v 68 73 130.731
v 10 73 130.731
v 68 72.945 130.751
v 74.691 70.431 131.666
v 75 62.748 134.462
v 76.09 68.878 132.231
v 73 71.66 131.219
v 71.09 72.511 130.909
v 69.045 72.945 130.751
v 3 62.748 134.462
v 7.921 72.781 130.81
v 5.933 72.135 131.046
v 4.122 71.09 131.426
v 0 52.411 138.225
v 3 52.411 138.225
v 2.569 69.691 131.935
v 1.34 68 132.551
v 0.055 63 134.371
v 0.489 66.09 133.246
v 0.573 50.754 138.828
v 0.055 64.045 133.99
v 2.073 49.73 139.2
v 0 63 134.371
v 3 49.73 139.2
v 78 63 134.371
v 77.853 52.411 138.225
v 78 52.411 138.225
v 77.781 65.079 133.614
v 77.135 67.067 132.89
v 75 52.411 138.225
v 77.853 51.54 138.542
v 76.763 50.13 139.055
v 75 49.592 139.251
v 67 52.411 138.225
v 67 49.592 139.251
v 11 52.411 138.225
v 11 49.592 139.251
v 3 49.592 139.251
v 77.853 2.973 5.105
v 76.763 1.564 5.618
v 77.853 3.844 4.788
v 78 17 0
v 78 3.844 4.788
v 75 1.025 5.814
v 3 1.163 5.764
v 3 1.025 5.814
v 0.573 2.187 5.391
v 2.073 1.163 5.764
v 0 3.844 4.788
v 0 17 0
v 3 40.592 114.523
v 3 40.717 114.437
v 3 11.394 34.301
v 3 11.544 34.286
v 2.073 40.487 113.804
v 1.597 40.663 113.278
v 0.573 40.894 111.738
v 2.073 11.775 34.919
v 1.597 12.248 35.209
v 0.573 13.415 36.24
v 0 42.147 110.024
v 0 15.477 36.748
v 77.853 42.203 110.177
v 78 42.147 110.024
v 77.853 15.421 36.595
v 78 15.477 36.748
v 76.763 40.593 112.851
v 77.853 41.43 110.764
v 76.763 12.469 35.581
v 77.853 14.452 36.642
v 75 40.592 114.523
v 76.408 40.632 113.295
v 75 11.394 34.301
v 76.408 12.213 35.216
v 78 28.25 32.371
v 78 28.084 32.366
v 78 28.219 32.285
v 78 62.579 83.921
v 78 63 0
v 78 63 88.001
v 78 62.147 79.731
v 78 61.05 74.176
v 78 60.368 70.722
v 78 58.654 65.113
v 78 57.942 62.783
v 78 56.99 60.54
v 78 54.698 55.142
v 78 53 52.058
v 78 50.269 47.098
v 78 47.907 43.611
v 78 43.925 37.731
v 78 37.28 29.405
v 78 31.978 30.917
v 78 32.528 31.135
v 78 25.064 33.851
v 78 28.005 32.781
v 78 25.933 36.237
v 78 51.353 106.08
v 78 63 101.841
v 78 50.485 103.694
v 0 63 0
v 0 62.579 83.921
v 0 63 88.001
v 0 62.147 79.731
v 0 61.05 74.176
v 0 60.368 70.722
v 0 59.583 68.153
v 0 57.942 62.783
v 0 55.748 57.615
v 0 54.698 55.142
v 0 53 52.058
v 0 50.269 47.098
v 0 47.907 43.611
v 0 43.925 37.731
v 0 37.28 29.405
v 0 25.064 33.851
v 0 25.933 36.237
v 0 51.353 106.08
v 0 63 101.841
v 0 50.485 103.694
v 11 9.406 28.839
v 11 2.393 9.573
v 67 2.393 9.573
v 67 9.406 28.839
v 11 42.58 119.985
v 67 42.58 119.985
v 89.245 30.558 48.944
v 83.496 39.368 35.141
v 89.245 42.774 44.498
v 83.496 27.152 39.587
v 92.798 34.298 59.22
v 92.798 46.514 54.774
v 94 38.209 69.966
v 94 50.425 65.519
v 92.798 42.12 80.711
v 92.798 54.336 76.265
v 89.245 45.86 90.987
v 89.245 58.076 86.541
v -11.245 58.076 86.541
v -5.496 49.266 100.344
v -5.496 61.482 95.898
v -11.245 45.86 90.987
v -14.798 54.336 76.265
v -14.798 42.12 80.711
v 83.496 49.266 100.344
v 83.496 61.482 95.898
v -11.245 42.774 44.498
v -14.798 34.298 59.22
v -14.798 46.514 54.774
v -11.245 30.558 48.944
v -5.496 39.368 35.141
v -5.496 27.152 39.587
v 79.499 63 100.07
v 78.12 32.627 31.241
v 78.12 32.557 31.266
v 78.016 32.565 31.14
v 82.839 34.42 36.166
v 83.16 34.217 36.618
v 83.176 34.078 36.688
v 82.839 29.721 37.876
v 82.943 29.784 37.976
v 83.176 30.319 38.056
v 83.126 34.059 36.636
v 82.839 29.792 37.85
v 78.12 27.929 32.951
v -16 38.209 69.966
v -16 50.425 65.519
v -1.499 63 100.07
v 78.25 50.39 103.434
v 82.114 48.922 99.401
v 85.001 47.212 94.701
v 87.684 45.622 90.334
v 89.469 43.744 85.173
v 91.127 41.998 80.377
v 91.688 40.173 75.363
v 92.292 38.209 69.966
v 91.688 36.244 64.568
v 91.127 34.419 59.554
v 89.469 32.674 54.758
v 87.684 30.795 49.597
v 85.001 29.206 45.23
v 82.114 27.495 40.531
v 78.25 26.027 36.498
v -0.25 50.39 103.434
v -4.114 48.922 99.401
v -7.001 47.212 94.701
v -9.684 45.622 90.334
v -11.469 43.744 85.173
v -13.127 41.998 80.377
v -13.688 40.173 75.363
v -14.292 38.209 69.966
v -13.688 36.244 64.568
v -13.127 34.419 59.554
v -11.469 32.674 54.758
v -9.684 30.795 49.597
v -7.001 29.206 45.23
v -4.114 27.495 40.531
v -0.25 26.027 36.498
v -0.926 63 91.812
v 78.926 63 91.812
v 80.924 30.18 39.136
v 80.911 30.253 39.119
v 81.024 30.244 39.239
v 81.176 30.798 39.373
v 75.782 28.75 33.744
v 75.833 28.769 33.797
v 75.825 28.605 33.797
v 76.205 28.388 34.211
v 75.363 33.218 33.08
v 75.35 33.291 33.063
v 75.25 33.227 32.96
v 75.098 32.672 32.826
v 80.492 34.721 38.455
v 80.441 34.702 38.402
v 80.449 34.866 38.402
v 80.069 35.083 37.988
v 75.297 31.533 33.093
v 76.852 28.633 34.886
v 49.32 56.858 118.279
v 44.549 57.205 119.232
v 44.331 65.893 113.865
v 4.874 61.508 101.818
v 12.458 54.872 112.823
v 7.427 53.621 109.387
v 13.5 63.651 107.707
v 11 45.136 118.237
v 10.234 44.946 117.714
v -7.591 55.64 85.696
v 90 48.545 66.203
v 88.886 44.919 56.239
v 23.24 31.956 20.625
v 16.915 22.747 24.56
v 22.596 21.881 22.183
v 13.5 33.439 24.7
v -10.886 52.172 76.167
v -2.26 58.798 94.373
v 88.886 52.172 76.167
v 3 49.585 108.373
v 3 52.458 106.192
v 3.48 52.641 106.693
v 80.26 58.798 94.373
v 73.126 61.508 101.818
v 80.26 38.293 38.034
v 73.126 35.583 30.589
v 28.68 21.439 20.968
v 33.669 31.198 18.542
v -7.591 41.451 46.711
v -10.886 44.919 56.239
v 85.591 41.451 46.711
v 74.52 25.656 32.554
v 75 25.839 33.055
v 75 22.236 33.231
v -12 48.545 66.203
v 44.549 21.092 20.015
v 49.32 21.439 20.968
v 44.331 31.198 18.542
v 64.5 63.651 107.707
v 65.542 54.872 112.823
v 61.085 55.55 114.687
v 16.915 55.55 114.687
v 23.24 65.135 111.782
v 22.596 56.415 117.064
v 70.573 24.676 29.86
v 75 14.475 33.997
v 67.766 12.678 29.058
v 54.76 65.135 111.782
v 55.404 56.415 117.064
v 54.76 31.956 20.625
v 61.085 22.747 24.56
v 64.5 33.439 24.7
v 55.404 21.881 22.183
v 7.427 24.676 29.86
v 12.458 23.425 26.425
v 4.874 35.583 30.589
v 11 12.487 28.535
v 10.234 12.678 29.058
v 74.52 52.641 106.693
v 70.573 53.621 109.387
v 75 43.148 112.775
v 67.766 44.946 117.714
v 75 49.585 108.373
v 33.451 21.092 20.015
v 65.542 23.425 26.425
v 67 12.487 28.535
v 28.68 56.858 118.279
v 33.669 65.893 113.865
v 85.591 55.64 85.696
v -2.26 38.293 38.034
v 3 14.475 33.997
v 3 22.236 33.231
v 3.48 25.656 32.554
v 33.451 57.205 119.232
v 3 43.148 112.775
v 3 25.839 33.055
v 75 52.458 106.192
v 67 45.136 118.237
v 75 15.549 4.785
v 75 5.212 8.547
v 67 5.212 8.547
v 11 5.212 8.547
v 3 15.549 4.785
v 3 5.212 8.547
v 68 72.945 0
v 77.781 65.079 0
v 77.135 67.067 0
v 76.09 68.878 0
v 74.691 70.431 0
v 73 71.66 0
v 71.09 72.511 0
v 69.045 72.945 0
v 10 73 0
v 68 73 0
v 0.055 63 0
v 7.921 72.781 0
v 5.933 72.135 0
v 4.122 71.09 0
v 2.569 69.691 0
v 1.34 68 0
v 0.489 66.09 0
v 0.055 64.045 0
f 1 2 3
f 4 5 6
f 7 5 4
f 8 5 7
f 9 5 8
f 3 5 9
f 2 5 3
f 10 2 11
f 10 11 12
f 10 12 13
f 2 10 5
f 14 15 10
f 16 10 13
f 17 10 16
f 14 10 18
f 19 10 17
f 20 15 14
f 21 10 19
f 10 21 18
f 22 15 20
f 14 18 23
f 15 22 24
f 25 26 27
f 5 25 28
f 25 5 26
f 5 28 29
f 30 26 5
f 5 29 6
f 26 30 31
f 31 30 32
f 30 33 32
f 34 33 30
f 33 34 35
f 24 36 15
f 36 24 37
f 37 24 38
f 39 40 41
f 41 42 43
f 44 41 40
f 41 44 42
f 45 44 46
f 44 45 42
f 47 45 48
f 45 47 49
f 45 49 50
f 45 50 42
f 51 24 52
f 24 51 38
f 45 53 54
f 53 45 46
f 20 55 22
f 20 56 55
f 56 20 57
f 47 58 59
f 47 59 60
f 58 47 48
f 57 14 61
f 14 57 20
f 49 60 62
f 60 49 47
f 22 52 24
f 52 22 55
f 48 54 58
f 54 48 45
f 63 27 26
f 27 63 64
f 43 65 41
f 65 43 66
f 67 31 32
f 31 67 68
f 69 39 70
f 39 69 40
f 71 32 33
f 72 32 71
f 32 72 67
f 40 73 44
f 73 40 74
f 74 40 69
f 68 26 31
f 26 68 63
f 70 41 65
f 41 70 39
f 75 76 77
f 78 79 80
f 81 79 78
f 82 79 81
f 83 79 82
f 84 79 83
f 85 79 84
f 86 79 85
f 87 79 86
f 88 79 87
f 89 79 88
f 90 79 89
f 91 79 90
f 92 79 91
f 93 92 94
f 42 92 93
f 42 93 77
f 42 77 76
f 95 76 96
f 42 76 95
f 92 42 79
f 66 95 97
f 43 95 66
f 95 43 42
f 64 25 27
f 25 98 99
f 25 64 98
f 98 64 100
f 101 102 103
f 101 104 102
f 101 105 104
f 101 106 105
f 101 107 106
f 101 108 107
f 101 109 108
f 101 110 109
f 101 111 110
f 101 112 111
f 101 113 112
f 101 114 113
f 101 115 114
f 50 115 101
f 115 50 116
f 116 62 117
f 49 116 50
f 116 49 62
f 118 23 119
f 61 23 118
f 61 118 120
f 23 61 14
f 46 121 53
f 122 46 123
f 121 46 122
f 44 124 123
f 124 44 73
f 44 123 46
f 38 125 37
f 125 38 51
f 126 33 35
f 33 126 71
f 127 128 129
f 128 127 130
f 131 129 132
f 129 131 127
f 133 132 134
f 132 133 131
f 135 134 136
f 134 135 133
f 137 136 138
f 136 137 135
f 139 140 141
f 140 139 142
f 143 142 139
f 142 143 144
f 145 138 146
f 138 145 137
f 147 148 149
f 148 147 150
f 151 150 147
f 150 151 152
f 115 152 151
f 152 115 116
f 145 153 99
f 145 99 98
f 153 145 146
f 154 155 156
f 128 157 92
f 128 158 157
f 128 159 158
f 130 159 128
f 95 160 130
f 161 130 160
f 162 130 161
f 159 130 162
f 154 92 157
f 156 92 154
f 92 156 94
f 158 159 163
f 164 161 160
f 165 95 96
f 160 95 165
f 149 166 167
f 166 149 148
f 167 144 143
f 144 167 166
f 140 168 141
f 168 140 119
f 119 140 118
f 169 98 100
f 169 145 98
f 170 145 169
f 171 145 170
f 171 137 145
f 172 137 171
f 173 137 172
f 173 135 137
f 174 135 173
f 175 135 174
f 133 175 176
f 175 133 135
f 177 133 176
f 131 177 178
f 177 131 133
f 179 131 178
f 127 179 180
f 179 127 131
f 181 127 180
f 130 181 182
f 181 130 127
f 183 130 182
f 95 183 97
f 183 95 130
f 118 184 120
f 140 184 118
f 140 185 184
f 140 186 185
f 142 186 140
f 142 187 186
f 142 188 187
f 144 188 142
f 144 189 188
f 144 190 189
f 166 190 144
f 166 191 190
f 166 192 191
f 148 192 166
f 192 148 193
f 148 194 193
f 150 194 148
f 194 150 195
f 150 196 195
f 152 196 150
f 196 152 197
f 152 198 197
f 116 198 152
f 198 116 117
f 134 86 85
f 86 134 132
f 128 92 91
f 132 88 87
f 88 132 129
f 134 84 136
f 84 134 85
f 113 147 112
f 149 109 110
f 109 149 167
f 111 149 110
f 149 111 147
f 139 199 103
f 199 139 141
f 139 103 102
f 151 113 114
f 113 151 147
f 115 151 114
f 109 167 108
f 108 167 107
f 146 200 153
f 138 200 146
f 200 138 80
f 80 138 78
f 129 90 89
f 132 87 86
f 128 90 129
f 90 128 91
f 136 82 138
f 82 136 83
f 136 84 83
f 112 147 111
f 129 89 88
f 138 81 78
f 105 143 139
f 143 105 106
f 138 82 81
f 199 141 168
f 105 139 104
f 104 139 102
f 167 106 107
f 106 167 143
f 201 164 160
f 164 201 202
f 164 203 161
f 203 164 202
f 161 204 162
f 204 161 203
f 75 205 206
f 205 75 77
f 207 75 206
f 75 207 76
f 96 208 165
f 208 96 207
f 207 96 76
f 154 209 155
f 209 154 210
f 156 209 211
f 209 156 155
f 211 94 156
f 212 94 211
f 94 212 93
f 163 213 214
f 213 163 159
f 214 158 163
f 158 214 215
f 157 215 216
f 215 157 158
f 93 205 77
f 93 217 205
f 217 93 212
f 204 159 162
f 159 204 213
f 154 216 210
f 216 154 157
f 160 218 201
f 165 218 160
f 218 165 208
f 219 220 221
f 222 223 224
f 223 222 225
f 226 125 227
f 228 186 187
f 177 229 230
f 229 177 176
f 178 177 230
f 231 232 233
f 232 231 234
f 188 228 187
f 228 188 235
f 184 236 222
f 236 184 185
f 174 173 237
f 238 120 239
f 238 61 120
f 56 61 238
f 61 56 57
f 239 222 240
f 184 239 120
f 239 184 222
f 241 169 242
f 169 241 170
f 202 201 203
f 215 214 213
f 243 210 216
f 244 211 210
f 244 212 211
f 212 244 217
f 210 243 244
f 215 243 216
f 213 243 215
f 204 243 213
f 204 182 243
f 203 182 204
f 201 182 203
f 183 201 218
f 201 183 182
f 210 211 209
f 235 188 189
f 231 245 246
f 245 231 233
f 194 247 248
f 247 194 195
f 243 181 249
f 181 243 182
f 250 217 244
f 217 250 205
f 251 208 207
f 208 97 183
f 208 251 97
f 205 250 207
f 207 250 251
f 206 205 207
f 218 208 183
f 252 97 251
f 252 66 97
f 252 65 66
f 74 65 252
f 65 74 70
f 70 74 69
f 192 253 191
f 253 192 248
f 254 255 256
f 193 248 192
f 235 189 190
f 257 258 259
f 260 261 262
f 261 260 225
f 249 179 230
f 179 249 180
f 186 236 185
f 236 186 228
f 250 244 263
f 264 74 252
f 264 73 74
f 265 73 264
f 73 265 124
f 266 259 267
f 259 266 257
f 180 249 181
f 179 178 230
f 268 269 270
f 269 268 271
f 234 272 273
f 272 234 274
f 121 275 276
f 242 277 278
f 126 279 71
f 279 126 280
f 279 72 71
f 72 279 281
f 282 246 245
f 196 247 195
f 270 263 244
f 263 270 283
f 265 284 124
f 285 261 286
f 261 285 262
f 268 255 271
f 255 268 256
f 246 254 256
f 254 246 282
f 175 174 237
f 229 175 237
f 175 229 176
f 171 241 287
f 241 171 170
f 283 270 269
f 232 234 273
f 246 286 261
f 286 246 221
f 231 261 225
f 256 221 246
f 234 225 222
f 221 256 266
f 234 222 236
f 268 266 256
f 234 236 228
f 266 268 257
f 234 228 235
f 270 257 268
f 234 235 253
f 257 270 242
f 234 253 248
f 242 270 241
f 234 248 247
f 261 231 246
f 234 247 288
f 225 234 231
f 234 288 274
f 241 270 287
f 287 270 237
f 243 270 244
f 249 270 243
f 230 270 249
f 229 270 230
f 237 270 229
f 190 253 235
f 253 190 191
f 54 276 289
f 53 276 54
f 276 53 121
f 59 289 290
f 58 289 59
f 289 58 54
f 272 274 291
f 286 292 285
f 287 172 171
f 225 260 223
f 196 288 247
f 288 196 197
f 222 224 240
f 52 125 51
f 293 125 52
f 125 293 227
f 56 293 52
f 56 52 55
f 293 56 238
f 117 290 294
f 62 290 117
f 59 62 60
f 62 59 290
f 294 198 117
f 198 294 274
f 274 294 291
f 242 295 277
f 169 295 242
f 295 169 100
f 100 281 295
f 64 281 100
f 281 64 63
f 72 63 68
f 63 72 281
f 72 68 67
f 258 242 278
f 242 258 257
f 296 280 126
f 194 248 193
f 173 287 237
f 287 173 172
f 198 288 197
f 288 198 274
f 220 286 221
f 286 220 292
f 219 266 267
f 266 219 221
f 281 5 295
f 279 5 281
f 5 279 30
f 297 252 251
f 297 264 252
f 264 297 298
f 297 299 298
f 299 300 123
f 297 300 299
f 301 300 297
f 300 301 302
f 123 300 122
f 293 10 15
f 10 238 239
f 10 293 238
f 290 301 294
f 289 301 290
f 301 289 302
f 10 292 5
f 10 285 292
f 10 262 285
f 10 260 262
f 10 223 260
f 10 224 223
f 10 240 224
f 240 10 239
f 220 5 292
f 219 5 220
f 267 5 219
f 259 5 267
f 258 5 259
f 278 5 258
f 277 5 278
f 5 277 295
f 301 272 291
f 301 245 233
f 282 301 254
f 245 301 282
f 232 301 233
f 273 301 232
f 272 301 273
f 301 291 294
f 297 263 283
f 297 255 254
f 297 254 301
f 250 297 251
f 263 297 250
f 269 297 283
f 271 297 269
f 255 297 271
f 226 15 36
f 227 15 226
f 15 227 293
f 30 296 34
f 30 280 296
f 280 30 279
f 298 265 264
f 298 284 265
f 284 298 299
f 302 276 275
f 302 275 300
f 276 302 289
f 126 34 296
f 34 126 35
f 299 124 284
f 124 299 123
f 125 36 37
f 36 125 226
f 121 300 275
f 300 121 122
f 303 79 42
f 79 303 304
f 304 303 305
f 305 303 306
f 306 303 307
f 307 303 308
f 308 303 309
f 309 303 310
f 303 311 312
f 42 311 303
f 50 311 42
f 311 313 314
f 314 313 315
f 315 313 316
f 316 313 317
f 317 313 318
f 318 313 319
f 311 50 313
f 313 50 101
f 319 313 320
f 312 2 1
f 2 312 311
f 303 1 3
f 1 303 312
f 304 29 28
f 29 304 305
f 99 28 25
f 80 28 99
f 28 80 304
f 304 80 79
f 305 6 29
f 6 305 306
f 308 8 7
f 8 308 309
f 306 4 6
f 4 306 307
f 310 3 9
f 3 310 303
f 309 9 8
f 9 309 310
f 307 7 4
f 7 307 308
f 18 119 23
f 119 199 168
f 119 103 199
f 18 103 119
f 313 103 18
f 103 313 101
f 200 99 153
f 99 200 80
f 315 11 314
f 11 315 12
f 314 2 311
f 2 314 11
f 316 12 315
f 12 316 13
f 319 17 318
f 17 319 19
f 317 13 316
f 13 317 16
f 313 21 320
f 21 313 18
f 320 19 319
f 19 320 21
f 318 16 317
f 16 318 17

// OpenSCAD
// file: simple_rounded_cube.scad
module sr_cube(size=[1,1,1],radius=0.5,corners=[1,1,1,1]) {
    difference(){    
    cube(size);
    
        if(corners[0])
        translate([radius,radius,0])rotate([0,0,180])difference(){
                cube([radius*2,radius*2,size[2]]);
                cylinder(size[2],radius,radius);
        }
        if(corners[1])
        translate([size[0]-radius,radius,0])rotate([0,0,270])difference(){
                cube([radius*2,radius*2,size[2]]);
                cylinder(size[2],radius,radius);
        }
        if(corners[2])
        translate([size[0]-radius,size[1]-radius,0])rotate([0,0,0])difference(){
                cube([radius*2,radius*2,size[2]]);
                cylinder(size[2],radius,radius);
        }
        if(corners[3])
        translate([radius,size[1]-radius,0])rotate([0,0,90])difference(){
                cube([radius*2,radius*2,size[2]]);
                cylinder(size[2],radius,radius);
        }
        }
        
}


//sr_cube([20,20,5], radius=4,corners=[0,0,0,0]);
// main file
phone_w = 70;
phone_l = 138;
phone_h = 9;

charger_h = 9;
charger_dia = 100;

eps = 1;
s = 4;

border_w = 7;
stand_d = 73;
stand_angle = 20;

usb_hole_degree = 125;
usb_hole_w = 5;
usb_hole_l = 8;

front_radius = 3;
back_radius = 10;


include<simple_rounded_cube.scad>


intersection() {

difference() {

translate([0,phone_h+2*s,0]) rotate([-stand_angle,0,0])translate([0,-phone_h-2*s,0])

difference(){
    union(){
sr_cube([phone_w+2*s,phone_h+2*s + 1000,phone_l+s],radius=front_radius);
        
    translate([(phone_w+2*s)/2,phone_h+s,s+phone_l/2]) rotate([-90,0,0]) 
    cylinder(charger_h+s,charger_dia/2+s+eps,charger_dia/2+s+eps);
    translate([(phone_w+2*s)/2,phone_h+s+charger_h+s,s+phone_l/2]) rotate([-90,0,0]) 
    cylinder(10,charger_dia/2+s+eps,phone_w/2);

    }
    
    translate([s-eps,s-eps,s]) cube([phone_w+2*eps,phone_h+2*eps,phone_l]);
    translate([s+border_w,0,s]) cube([phone_w-2*border_w,phone_h,phone_l]);
    
    //translate([(phone_w+2*s)/2,phone_h+s+eps,s+phone_l/2]) rotate([-90,0,0]) 
    //cylinder(charger_h+2*eps,charger_dia/2+eps,charger_dia/2+eps);
    translate([(phone_w+2*s)/2,0,s+phone_l/2]) {
    
    rotate([-90,0,0]) 
    cylinder(charger_h+2*eps+phone_h + s,charger_dia/2+eps+5,charger_dia/2+eps);
    
        translate([-usb_hole_w/2,-usb_hole_w/2+phone_h+s+charger_h/2+eps,0]) rotate([0,usb_hole_degree,0])  sr_cube([usb_hole_l,usb_hole_w,1000]);
        
        }
    
}



translate([0,0,-10000])cube([10000,10000,10000]);
translate([0,stand_d,0])cube([10000,10000,10000]);

}

union(){
translate([0,-500,0]) sr_cube([phone_w+2*s,stand_d+500,phone_l+s],radius=back_radius);

translate([-500,0,0])cube([1000,stand_d-back_radius,phone_l+s]);
}
}
